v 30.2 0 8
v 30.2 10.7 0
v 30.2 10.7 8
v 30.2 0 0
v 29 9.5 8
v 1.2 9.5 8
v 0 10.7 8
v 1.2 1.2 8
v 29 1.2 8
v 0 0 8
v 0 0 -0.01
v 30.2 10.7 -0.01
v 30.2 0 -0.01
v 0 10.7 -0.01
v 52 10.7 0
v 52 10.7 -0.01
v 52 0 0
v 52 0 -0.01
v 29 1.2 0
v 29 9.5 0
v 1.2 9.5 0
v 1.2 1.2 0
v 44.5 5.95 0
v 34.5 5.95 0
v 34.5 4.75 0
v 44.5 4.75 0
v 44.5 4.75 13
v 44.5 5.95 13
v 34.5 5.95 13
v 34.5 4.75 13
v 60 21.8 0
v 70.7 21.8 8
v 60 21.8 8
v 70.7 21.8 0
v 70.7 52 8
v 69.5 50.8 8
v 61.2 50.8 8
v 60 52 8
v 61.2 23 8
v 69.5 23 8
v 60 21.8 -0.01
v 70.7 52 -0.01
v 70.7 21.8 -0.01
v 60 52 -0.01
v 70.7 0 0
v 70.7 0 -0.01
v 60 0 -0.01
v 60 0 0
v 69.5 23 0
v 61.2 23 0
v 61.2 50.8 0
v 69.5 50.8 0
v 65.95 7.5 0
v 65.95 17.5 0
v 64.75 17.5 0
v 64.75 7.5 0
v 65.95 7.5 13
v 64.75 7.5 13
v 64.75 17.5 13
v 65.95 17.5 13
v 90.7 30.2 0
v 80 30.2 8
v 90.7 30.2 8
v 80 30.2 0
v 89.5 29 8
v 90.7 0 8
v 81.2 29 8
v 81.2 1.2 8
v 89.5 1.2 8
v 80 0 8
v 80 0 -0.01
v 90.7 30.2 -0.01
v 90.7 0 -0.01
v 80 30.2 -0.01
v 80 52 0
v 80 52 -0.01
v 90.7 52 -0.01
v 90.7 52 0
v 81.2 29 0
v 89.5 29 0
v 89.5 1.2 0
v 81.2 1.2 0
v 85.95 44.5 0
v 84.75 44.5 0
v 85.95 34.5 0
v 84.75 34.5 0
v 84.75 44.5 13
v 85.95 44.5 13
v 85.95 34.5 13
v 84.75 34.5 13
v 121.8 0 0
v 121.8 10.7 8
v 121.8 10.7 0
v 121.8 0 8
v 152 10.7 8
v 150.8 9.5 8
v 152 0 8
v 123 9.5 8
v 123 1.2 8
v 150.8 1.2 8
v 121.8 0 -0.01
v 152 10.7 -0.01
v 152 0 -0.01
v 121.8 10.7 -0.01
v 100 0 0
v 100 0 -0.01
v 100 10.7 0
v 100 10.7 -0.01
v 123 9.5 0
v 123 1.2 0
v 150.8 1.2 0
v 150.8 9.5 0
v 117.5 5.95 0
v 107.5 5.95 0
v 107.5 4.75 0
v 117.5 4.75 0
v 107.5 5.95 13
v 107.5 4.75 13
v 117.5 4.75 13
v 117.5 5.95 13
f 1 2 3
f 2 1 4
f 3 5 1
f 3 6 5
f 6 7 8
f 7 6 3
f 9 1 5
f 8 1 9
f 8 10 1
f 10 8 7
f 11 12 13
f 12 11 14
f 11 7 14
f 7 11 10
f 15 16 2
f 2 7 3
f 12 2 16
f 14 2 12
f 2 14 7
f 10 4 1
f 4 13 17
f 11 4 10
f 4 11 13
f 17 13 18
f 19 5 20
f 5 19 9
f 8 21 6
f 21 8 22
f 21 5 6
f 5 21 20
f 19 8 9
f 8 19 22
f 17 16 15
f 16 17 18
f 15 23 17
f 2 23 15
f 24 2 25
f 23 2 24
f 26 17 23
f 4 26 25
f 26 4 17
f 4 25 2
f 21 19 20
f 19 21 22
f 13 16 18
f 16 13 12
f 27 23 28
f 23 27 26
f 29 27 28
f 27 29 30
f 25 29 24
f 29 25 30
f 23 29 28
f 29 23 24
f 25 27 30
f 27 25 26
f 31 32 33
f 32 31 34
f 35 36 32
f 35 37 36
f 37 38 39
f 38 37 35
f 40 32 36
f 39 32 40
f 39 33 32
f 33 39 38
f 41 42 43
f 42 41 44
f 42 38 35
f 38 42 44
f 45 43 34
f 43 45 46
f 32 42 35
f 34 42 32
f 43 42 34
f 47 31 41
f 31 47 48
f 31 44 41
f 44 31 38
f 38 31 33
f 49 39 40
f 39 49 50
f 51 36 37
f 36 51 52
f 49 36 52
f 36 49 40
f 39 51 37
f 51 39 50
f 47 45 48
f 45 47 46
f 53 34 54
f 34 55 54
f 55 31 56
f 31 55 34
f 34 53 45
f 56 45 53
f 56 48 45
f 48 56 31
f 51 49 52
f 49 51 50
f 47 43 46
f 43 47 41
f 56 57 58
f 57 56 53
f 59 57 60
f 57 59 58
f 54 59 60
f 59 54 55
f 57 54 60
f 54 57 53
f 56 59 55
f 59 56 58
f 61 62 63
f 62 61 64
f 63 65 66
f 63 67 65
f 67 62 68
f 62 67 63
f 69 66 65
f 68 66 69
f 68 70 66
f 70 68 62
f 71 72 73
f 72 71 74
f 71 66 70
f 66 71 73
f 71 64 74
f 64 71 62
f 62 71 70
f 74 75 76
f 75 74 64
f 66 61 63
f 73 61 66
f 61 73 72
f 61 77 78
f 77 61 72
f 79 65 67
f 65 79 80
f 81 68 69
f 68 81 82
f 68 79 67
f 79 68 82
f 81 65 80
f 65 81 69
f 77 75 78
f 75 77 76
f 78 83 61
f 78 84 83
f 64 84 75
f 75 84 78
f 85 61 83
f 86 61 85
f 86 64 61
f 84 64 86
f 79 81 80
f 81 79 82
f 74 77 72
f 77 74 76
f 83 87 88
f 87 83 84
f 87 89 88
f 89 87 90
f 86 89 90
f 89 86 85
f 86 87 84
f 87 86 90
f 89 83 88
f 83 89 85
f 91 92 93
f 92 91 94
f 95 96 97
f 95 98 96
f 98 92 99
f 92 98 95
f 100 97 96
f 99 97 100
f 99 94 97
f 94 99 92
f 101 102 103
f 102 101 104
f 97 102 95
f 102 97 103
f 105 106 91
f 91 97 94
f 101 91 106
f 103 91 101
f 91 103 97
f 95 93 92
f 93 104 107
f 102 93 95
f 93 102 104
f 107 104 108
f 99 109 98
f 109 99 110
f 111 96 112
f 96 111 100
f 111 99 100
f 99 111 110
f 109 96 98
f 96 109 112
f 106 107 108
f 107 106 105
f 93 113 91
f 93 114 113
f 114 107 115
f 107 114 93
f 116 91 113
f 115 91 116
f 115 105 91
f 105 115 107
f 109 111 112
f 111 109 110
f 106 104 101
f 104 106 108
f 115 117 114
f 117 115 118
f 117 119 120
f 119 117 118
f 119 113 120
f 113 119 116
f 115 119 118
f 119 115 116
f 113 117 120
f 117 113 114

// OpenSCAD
// file: ../../Base/Boxes.scad
// Fischertechnik Box Foundation
// Pre-designed Boxes

use <Constants.scad>

include <PlacementOptions.scad>

box190Width = 190;
box190Depth = 130;
box130Width = 130;
box130Depth = 95;
boxUsageHeight = 33.9;
boxWallThickness = 2.4;
boxBaseThickness = 1.0;
boxWebWidth = 3.0;

// getBoxWallThickness()
// Gets the wall thickness of a Fischertechnik Box

function getBoxWallThickness() = boxWallThickness;

// Gets the usable height of a fischertechnik box
function getBoxUsageHeight() = boxUsageHeight;

// Gets the thickness of the Fischertechnik box base.
function getBoxBaseThickness() = boxBaseThickness;

// Gets the width of a box web
function getBoxWebWidth() = boxWebWidth;

// Gets the usable inner space of a Box 190 as an x/y-list
function getBox190Space() = [
    box190Width - 2*getBoxWallThickness(), 
    box190Depth - 2*getBoxWallThickness() ];

// Imports the Fischertechnik empty box 130x190 mm and places it at position 0,0
// 190x130 are the outer sizes, the inner space is slightly smaller. Use getBox190Space() to get the inner sizes.
// This module needs the STL file "Fischertechnik Box 130x190.stl" in the library path.
// The box is positioned that the usable inner space is at the 0,0,0 position. The

module Box190() {
    translate([-getBoxWallThickness(),-getBoxWallThickness(),-getBoxBaseThickness()])
        import("Fischertechnik Box 130x190.stl", convexity=3);
}

// Gets the usable inner space of a Box 130 as an x/y-list
function getBox130Space() = [
    box130Width - 2*getBoxWallThickness(), 
    box130Depth - 2*getBoxWallThickness() ];

// Imports the Fischertechnik empty box 95x130 mm and places it at position 0,0
// 190x130 are the outer sizes, the inner space is slightly smaller. Use getBox190Space() to get the inner sizes.
// This module needs the STL file "Fischertechnik Box 95x130.stl" in the library path.
// The box is positioned that the usable inner space is at the 0,0,0 position. The

module Box130() {
    translate([-getBoxWallThickness(),-getBoxWallThickness(),-getBoxBaseThickness()])
        import("Fischertechnik Box 95x130.stl", convexity=3);
}

// Creates a web at the specified box walls
// corner 0 = LowerLeft, 1 = UpperLeft, 2 = UpperRight, 3 = LowerRight
// side 0 = LeftOfCorner, 1 = RightOfCorner
// distance = Distance in mm from the corner
// box = inner width and depth of the box (default: Box 190)
// webWidth = length of the web (default is 3 mms)
// webThickness = thickness of the web (default is 1 mm)

module BoxWeb(corner, side, distance, box=getBox190Space(), webWidth=getBoxWebWidth(), webThickness=1.0) {
    sink = getBoxWallThickness()/2;

    width = (corner % 2 == 0) ? 
            (side == LeftOfCorner ? webWidth : webThickness) :
            (side == LeftOfCorner ? webThickness : webWidth);

    depth = (corner % 2 == 0) ? 
            (side == RightOfCorner ? webWidth : webThickness) :
            (side == RightOfCorner ? webThickness : webWidth);
    
    xDiff = corner == LowerLeft ? 
                (side == LeftOfCorner ? -sink : distance) :
            (corner == UpperLeft ?                
                (side == LeftOfCorner ? distance : -sink) :
            (corner == UpperRight ?
                (side == LeftOfCorner ? box.x-webWidth+sink : box.x-distance-webThickness) :
                (side == LeftOfCorner ? box.x-distance-webThickness: box.x-webWidth+sink)));

    yDiff = corner == LowerLeft ? 
                (side == RightOfCorner ? -sink : distance) :
            (corner == UpperLeft ?
                (side == RightOfCorner ? box.y-distance : box.y-webWidth+sink) :
            (corner == UpperRight ?
                (side == RightOfCorner ? box.y-webWidth+sink : box.y-distance) :
                (side == RightOfCorner ? distance : -sink)));
    
    translate([xDiff, yDiff, -getExcess()])
        cube([width, depth, boxUsageHeight + 2*getExcess()]);
}
// file: ../../Base/Rotation.scad
// Fischertechnik Box Foundation
// Geometry Helpers Rotation

include <PlacementOptions.scad>

// getRotatedSpace(space, rotation=NoRotation)
// Rotates the space dependent on the specified rotation

function getRotatedSpace(space, rotation=NoRotation) = [
    (rotation == Rotate90 || rotation == Rotate270) ? space.y : space.x,
    (rotation == Rotate90 || rotation == Rotate270) ? space.x : space.y
];

// Rotates the given space around the fixed left lower corner
// space = the space the children needs as width/depth list [width,depth]
// rotation = 0 Rotate0 degrees, 1 Rotate90 degrees, 2 Rotate180 degrees, 3 Rotate270 degrees (equivalent to -90)

module RotateFix(space, rotation=NoRotation) {
    dy = (rotation == Rotate0 || rotation == Rotate270) ? 0 :
        (rotation == Rotate90) ? space.x :
        space.y;
    dx = (rotation < Rotate180) ? 0 :
        (rotation == Rotate180) ? space.x :
        space.y;
    
    translate([dx, dy, 0])
        rotate([0, 0, rotations[rotation]])
            children();
}
// file: ../../Base/Alignment.scad
// Fischertechnik Box Foundation
// Geometry Helpers Alignment

include <PlacementOptions.scad>

// getAlignedX(elementWidth, spaceWidth, align=AlignRight, offset=0)
// Gets the aligned X offset of an element with the given
// width in the given space.
// elementWidth = The width of the element to positon
// spaceWidth = The space where the element should be aligned
// align = 0 AlignLeft, 1 AlignCenter, 2 AlignRight
// offset = an optional offset from the aligned position. When
// aligned left or centered, then positive values are in X direction.
// When aligned right then positive values are in negative X direction.

function getAlignedX(elementWidth, spaceWidth, align=AlignRight, offset=0) =
    (align == AlignLeft) ?
        offset :
        ((align == AlignCenter) ?
        (spaceWidth - elementWidth)/2 + offset :
        spaceWidth - offset - elementWidth);

// getAlignedY(elementDepth, spaceDepth, align=AlignTop, offset=0)
// Gets the aligned Y offset of an element with the given
// depth in the given space.
// elementDepth = The depth of the element to positon
// spaceDepth = The space where the element should be aligned
// align = 0 AlignBottom, 1 AlignCenter, 2 AlignTop
// offset = an optional offset from the aligned position. When
// aligned bottom or centered, then positive values are in Y direction.
// When aligned top then positive values are in negative Y direction.

function getAlignedY(elementDepth, spaceDepth, align=AlignTop, offset=0) =
    (align == AlignBottom) ?
        offset :
        ((align == AlignCenter) ?
        (spaceDepth - elementDepth)/2 + offset :
        spaceDepth - offset - elementDepth);
// file: ../../Base/Constants.scad
// Fischertechnik Box Foundation
// Constants

// Constant values necessary for multiple elements

// Base constants
dividerThickness = 1.2;
excess = 0.01;
fragments = 90;
tolerance = 0.8;

// Gets the thickness of a divider 
function getDividerThickness() = dividerThickness;

// Gets the excess that is used to merge walls into each other
function getExcess() = excess;

// Gets amount of fragments of a cylinder
function getFragments() = fragments;

// Gets the inner tolerance of a frame to each side
function getTolerance() = tolerance;


// Fischertechnik specific constants
axisDiameter = 4;
axisBottomDiameter = axisDiameter + 1;
axisTolerance = 0.2;
axisLockingLength = 8;

// Gets axis diameter of Fischertechnik axis
function getAxisDiameter() = axisDiameter;

// Gets axis diameter tolerance (subtracted for element axis)
function getAxisTolerance() = axisTolerance;

// Gets the axis diameter for standing axis
function getStandAxisDiameter() = getAxisDiameter() - getAxisTolerance();

// Gets axis bottom diameter for thicker part at the bottom
function getAxisBottomDiameter() = axisBottomDiameter;

// Gets the lengthh of the locking part of a locking axis
function getAxisLockingLength() = axisLockingLength;

// Studs

studHeight = 2.5;
studTolerance = 0.2;
studRailDistance = 9;   // as in ft 50

// gets the height of a connecting stud
function getStudHeight() = studHeight;

// gets the connecting stud height tolerance
function getStudTolerance() = studTolerance;

// gets the default rail distance for studs
function getStudRailDistance() = studRailDistance;

// Dockable Frame with Edge

standardEdgeDistance = 2.5;
standardWebDistance = 11.5;
standardCornerLength = 15;

// gets the standard distance to the wall of the box for dockable frames with webs
function getStandardEdgeDistance() = standardEdgeDistance;

// gets the standard distance of each web to the corner of the dockable frame
function getStandardWebDistance() = standardWebDistance;

// gets the standard length of the corner walls of a dockable frame
function getStandardCornerLength() = standardCornerLength;

// Tubes

tubeWallFactor = 0.8;

// gets the wall thickness of a tube.
function getTubeWallThickness() = tubeWallFactor * getDividerThickness();

// Small Parts and Divider Frame

smallPartsFrameHeight = 20;

// gets the frame height for docked small parts boxes.
function getSmallPartsFrameHeight() = smallPartsFrameHeight;

// Hubs

hubRingDiameter = 19.5;
hubRingLevelDiameter = 21;

// gets the diameter of a tube matching the inner ring of a wheel
function getHubRingDiameter() = hubRingDiameter;

// gets the diameter of a hub tube with a thicker diameter
function getHubRingLevelDiameter() = hubRingLevelDiameter;

// Struts

strutAddLength = 9.0;
strutDepth = 8.0;
strutThickness = 2.8;
strutOuterTolerance = 0.6;

// gets the full length of a strut (nominal length plus 2x radius at the ends)
function getFullStrutLength(length) = length + strutAddLength;

// gets the radius of the end of a strut
function getStrutEndRadius() = strutAddLength / 2;

// gets the the depth (width) of a strut
function getStrutDepth() = strutDepth;

// gets the the thickness of a strut
function getStrutThickness() = strutThickness;

// gets the tolerance added to the strut sizes for strut holders
function getStrutOuterTolerance() = strutOuterTolerance;

// Propeller

propellerAxisDiameter = 7.0;
propellerAxisTolerance = 0.2;

// gets the propeller axis outer diameter
function getPropellerAxisDiameter() = propellerAxisDiameter;

// gets the propeller axis printing tolerance
function getPropellerAxisTolerance() = propellerAxisTolerance;
// file: ../../Base/PlacementOptions.scad
// Fischertechnik Box Foundation
// Placement Options

// Alignment
NoAlign = 0;
AlignLeft = 1;
AlignBottom = 2;
AlignCenter = 3;
AlignRight = 4;
AlignTop = 5;

// Element rotation degree steps
rotations = [0, -90, -180, -270];

// Rotation
NoRotation = 0;
Rotate0 = 0;
Rotate90 = 1;
Rotate180 = 2;
Rotate270 = 3;

// Docking (seen from above)
NoDock = -1;
DockLeft = 0;
DockTop = 1;
DockRight = 2;
DockCorner = 2;
DockBottom = 3;

// Web corners
LowerLeft = 0;
UpperLeft = 1;
UpperRight = 2;
LowerRight = 3;

// Web position relative to corner
LeftOfCorner = 0;
RightOfCorner = 1;
// file: ../../Elements/FrameBracketWithoutWorm.scad
// Fischertechnik Box Library
// Frame  for bracket without worm
// 31046

use <../Base/Constants.scad>
use <../ModelBase/Complex.scad>

// getFrameBracketWithoutWormSpace()
// Gets the space for a frame for a bracket with worm.

function getFrameBracketWithoutWormSpace() = getFrameBracketSpace();

// FrameBracketWithoutWorm()
// Frame for bracket with worm.

module FrameBracketWithoutWorm() {
    FrameBracket([ 10, getDividerThickness(), 13 ]);
}

// Test
color("lightgray")
FrameBracketWithoutWorm();
// file: ../../Base/Placement.scad
// Fischertechnik Box Foundation
// Geometry Helpers Placement

use <Constants.scad>
use <Alignment.scad>
use <Rotation.scad>
use <Boxes.scad>

include <PlacementOptions.scad>

// Place(x=0, y=0, elementSpace=[0,0], alignX=AlignLeft, alignY=AlignBottom, rotation=Rotate0, boxSpace=getBox190Space())
// Places the child at the specified position
// y = Y-Position. This is a relative position when an X aligment is specified.
// x = X-Position. This is a relative position when an Y aligment is specified.
// elementSpace = space of the element to be placed [x,y]
// alignX = -1=NoAlign, 0 AlignLeft, 1 AlignCenter, 3 AlignRight (elementSpace and boxSpace required!)
// alignY = -1=NoAlign, 2 AlignBottom, 1 AlignCenter, 4 AlignTop (elementSpace and boxSpace required!)
// rotation = 0 Rotate0 0 degrees, 1 Rotate90 90 degrees, 
// 2 Rotate180 180 degrees, 3 Rotate270 270 degrees (equivalent to -90)
// boxSpace = Inner space of the box where the placement occurs [x,y] - default is Box 190x130 inner space

module Place(x=0, y=0, elementSpace=[0,0], 
  alignX=AlignLeft, alignY=AlignBottom, 
  rotation=NoRotation, boxSpace=getBox190Space()) {

    module Position(x, y, space, rotation=Rotate0) {
        translate([x, y, 0])
            RotateFix(space, rotation)
                children();
    }

    space = getRotatedSpace(elementSpace, rotation);
    alignedX = getAlignedX(space.x, boxSpace.x, alignX, x);
    alignedY = getAlignedY(space.y, boxSpace.y, alignY, y);
    Position(alignedX, alignedY, elementSpace, rotation)
        children();
}

// Center(space=getBox130Space(), elementSpace=[0,0])
// space = Space where the children is centered. For cylinder use centered=true and no elementSpace.
// elementSpace = space of the element to be centered [x,y]

module Center(space=getBox190Space(), elementSpace=[0,0]) {
    translate([(space.x - elementSpace.x) / 2, (space.y - elementSpace.y) / 2])
        children(0);
}

// CenterHorizontal(width=0, y=0, offset=0, space=getBox130Space())
// space = Space where the children is centered. For cylinder use centered=true and no elementSpace.
// elementSpace = space of the element to be centered [x,y]

module CenterHorizontal(width=0, y=0, offset=0, space=getBox190Space()) {
    translate([(space.x - width) / 2 + offset, y])
        children(0);
}

// CenterVertical(depth=0, x=0, offset=0, space=getBox130Space())
// space = Space where the children is centered. For cylinder use centered=true and no elementSpace.
// elementSpace = space of the element to be centered [x,y]

module CenterVertical(depth=0, x=0, offset=0, space=getBox190Space()) {
    translate([x, (space.y - depth) / 2 + offset])
        children(0);
}
// main file
// Fischertechnik Box Foundation
// Elements
// Test FrameBracketWithoutWorm

use <../../Base/Placement.scad>
use <../../Elements/FrameBracketWithoutWorm.scad>

include <../../Base/PlacementOptions.scad>

FrameBracketWithoutWorm();

Place(60, 0, getFrameBracketWithoutWormSpace(), rotation=Rotate90)
    FrameBracketWithoutWorm();

Place(80, 0, getFrameBracketWithoutWormSpace(), rotation=Rotate270)
    FrameBracketWithoutWorm();

Place(100, 0, getFrameBracketWithoutWormSpace(), rotation=Rotate180)
    FrameBracketWithoutWorm();
